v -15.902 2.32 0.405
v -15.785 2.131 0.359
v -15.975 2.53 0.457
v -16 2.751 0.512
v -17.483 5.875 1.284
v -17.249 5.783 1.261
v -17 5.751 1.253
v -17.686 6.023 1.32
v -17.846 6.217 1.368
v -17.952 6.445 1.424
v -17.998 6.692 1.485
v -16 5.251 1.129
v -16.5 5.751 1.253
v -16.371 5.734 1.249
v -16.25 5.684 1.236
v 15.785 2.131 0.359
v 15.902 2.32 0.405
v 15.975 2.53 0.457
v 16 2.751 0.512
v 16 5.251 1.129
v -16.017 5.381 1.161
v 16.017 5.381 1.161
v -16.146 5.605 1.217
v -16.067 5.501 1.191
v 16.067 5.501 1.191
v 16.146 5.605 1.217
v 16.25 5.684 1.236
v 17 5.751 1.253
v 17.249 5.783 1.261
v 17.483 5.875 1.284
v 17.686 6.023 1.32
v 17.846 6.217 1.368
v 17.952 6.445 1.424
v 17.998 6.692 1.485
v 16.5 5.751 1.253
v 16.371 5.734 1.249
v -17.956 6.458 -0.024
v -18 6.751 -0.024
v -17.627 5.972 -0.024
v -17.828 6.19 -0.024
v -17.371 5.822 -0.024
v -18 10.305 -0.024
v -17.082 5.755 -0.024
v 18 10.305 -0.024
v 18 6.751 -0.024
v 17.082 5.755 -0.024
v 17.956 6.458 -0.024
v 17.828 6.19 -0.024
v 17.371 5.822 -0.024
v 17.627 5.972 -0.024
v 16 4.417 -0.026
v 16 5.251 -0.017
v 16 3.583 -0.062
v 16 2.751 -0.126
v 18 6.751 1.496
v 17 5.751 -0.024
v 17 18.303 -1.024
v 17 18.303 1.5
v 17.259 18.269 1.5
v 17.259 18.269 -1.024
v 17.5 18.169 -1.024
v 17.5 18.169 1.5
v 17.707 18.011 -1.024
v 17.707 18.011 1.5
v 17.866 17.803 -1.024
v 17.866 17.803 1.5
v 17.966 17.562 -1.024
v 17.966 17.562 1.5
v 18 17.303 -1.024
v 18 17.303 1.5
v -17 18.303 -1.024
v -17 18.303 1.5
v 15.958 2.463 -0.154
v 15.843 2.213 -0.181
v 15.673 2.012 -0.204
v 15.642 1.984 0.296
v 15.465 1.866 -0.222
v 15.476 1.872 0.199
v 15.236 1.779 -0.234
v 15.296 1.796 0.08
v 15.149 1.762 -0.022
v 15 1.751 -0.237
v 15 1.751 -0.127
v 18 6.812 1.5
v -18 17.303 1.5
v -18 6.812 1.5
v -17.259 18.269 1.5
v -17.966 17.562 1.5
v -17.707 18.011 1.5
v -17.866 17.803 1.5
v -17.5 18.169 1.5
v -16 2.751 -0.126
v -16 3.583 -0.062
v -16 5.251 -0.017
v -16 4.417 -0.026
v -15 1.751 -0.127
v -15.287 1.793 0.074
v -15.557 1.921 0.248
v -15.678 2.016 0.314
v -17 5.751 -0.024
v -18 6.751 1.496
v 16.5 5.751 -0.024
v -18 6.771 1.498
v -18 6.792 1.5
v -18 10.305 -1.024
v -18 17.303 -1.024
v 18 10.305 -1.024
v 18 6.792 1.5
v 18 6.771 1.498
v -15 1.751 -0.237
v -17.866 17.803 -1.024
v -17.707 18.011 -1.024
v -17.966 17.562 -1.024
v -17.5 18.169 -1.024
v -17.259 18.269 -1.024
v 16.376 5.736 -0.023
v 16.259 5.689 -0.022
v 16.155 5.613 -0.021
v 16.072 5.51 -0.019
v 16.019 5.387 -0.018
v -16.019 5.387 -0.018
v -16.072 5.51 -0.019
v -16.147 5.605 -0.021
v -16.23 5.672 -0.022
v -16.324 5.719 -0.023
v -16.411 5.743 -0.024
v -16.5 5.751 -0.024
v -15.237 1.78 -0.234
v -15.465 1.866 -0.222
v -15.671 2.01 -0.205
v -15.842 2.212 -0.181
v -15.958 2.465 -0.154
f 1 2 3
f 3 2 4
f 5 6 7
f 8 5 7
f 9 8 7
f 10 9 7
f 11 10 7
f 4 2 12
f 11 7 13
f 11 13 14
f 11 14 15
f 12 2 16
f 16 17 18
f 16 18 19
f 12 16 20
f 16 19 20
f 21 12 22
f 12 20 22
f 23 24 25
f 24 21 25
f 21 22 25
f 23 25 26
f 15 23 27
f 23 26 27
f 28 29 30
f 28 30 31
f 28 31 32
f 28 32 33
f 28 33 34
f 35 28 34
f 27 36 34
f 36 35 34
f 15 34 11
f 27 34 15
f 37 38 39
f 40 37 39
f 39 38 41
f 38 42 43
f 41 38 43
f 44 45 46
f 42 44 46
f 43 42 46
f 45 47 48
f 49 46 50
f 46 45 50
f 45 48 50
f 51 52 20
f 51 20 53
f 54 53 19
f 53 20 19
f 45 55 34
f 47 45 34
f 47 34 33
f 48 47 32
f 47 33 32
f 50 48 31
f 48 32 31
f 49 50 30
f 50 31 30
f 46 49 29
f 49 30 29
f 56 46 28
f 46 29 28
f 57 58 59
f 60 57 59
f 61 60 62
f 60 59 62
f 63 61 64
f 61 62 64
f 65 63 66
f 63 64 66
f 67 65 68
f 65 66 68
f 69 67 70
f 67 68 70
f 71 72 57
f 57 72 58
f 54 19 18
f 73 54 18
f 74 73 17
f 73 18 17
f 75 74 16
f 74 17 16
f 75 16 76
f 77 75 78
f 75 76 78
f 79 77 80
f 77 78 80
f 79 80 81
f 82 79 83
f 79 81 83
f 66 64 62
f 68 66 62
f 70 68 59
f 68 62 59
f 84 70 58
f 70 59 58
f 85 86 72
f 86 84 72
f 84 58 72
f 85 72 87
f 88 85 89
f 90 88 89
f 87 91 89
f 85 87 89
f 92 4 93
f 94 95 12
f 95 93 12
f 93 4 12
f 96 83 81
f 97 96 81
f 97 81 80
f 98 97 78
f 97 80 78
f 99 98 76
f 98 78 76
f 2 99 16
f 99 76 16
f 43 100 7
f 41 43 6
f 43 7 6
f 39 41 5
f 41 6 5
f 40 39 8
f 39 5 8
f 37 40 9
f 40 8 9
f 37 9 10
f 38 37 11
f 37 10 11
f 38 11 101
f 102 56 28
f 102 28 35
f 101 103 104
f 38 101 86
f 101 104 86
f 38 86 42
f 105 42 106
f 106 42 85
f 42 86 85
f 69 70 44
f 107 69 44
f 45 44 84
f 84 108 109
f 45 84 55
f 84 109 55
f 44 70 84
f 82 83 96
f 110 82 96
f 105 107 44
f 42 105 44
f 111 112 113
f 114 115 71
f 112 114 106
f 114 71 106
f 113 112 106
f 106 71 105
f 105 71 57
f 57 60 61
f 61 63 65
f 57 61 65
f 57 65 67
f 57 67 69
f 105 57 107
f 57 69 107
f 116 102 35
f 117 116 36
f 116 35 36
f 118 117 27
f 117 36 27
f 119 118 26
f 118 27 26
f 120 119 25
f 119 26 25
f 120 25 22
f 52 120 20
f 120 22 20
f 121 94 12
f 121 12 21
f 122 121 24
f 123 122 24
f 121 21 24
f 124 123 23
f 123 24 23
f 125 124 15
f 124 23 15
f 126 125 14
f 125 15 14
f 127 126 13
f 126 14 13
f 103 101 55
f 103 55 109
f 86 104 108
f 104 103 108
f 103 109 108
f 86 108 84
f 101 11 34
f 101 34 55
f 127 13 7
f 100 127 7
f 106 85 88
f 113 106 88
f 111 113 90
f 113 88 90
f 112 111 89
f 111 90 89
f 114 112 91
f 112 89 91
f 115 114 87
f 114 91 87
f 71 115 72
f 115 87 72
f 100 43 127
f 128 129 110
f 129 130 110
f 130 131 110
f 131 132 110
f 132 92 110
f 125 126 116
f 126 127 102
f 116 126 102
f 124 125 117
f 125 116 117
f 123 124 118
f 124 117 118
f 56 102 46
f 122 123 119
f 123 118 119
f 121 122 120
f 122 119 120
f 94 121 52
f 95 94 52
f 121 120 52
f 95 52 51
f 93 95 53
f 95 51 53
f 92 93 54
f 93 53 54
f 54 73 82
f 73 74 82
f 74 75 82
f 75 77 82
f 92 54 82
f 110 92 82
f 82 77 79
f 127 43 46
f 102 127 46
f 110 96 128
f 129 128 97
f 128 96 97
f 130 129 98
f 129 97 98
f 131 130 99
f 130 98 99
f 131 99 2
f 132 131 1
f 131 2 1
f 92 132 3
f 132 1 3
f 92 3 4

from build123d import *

# Parameters (mm, degrees)
BOSS_EXTRUDE1_DEPTH      = 1.5
BOSS_EXTRUDE1_DEPTH_BACK = 1.2
CUT_EXTRUDE1_DEPTH       = 40


with BuildPart() as part:
    # Sketch1 → Boss-Extrude1 (new body, two sides)
    with BuildSketch(Plane.XY) as boss_extrude1_sk:
        with BuildLine():
            Line((-17.999999991, 9.304537824), (-17.999999991, 10.304506021))
            Line((-17.999999991, 10.304506021), (-17.999999991, 17.303464443))
            ThreePointArc((-17.999999991, 17.303464443), (-17.707106772, 18.010571225), (-16.999999991, 18.303464443))
            Line((-16.999999991, 18.303464443), (16.999968161, 18.303464443))
            ThreePointArc((16.999968161, 18.303464443), (17.707074942, 18.010571225), (17.999968161, 17.303464443))
            Line((17.999968161, 17.303464443), (17.999968161, 9.303464443))
            Line((17.999968161, 9.303464443), (17.999968161, 6.751174458))
            ThreePointArc((17.999968161, 6.751174458), (17.707074942, 6.044067677), (16.999968161, 5.751174458))
            Line((16.999968161, 5.751174458), (16.499999991, 5.751174458))
            ThreePointArc((16.499999991, 5.751174458), (16.1464466, 5.604727849), (15.999999991, 5.251174458))
            Line((15.999999991, 5.251174458), (15.999999991, 2.751174458))
            ThreePointArc((15.999999991, 2.751174458), (15.707106772, 2.044067677), (14.999999991, 1.751174458))
            Line((14.999999991, 1.751174458), (-14.999999991, 1.751174458))
            ThreePointArc((-14.999999991, 1.751174458), (-15.707106772, 2.044067677), (-15.999999991, 2.751174458))
            Line((-15.999999991, 2.751174458), (-15.999999991, 5.251174458))
            ThreePointArc((-15.999999991, 5.251174458), (-16.1464466, 5.604727849), (-16.499999991, 5.751174458))
            Line((-16.499999991, 5.751174458), (-16.999999991, 5.751174458))
            ThreePointArc((-16.999999991, 5.751174458), (-17.707106772, 6.044067677), (-17.999999991, 6.751174458))
            Line((-17.999999991, 6.751174458), (-17.999999991, 9.304537824))
        make_face()
    extrude(amount=BOSS_EXTRUDE1_DEPTH)
    extrude(boss_extrude1_sk.sketch, amount=-BOSS_EXTRUDE1_DEPTH_BACK)

    # Sketch3 → Cut-Extrude1 (cut)
    with BuildSketch(Plane(origin=(17.999968161, 0, 0), x_dir=(0, 0, -1), z_dir=(1, 0, 0))):
        with BuildLine():
            Line((0.023796664, 6.751174458), (0.023796664, 5.754537824))
            ThreePointArc((0.023796664, 5.754537824), (0.053060483, 3.748723952), (0.23729316, 1.751174458))
            Line((0.23729316, 1.751174458), (1.2708887, 1.751174458))
            Line((1.2708887, 1.751174458), (1.2708887, 10.304537824))
            Line((1.2708887, 10.304537824), (1.2708887, 10.30507849))
            ThreePointArc((1.2708887, 10.30507849), (7.212872074, 16.614024598), (1.023796664, 22.680762846))
            Line((1.023796664, 22.680762846), (1.023796664, 17.303464443))
            Line((1.023796664, 17.303464443), (1.2, 17.303464443))
            Line((1.2, 17.303464443), (1.2, 6.751174458))
            Line((1.2, 6.751174458), (0.023796664, 6.751174458))
        make_face()
        Polygon((0.023796664, 10.304537824), (0.023796664, 6.751174458), (1.2, 6.751174458), (1.2, 17.303464443), (1.023796664, 17.303464443), (1.023796664, 10.304537824), align=None)
        with BuildLine():
            ThreePointArc((-1.485404738, 6.692099607), (-1.491731963, 6.721473521), (-1.496283327, 6.751174458))
            Line((-1.496283327, 6.751174458), (-1.5, 6.751174458))
            Line((-1.5, 6.751174458), (-1.5, 1.751174458))
            Line((-1.5, 1.751174458), (0.126821568, 1.751174458))
            ThreePointArc((0.126821568, 1.751174458), (-0.181429151, 1.857497567), (-0.358583171, 2.131248481))
            Line((-0.358583171, 2.131248481), (-1.485404738, 6.692099607))
        make_face()
        with BuildLine():
            Line((-1.5, 6.751174458), (-1.496283327, 6.751174458))
            ThreePointArc((-1.496283327, 6.751174458), (-1.499069967, 6.781543322), (-1.5, 6.812025585))
            Line((-1.5, 6.812025585), (-1.5, 6.751174458))
        make_face()
    extrude(amount=-CUT_EXTRUDE1_DEPTH, mode=Mode.SUBTRACT)


solid = part.part
